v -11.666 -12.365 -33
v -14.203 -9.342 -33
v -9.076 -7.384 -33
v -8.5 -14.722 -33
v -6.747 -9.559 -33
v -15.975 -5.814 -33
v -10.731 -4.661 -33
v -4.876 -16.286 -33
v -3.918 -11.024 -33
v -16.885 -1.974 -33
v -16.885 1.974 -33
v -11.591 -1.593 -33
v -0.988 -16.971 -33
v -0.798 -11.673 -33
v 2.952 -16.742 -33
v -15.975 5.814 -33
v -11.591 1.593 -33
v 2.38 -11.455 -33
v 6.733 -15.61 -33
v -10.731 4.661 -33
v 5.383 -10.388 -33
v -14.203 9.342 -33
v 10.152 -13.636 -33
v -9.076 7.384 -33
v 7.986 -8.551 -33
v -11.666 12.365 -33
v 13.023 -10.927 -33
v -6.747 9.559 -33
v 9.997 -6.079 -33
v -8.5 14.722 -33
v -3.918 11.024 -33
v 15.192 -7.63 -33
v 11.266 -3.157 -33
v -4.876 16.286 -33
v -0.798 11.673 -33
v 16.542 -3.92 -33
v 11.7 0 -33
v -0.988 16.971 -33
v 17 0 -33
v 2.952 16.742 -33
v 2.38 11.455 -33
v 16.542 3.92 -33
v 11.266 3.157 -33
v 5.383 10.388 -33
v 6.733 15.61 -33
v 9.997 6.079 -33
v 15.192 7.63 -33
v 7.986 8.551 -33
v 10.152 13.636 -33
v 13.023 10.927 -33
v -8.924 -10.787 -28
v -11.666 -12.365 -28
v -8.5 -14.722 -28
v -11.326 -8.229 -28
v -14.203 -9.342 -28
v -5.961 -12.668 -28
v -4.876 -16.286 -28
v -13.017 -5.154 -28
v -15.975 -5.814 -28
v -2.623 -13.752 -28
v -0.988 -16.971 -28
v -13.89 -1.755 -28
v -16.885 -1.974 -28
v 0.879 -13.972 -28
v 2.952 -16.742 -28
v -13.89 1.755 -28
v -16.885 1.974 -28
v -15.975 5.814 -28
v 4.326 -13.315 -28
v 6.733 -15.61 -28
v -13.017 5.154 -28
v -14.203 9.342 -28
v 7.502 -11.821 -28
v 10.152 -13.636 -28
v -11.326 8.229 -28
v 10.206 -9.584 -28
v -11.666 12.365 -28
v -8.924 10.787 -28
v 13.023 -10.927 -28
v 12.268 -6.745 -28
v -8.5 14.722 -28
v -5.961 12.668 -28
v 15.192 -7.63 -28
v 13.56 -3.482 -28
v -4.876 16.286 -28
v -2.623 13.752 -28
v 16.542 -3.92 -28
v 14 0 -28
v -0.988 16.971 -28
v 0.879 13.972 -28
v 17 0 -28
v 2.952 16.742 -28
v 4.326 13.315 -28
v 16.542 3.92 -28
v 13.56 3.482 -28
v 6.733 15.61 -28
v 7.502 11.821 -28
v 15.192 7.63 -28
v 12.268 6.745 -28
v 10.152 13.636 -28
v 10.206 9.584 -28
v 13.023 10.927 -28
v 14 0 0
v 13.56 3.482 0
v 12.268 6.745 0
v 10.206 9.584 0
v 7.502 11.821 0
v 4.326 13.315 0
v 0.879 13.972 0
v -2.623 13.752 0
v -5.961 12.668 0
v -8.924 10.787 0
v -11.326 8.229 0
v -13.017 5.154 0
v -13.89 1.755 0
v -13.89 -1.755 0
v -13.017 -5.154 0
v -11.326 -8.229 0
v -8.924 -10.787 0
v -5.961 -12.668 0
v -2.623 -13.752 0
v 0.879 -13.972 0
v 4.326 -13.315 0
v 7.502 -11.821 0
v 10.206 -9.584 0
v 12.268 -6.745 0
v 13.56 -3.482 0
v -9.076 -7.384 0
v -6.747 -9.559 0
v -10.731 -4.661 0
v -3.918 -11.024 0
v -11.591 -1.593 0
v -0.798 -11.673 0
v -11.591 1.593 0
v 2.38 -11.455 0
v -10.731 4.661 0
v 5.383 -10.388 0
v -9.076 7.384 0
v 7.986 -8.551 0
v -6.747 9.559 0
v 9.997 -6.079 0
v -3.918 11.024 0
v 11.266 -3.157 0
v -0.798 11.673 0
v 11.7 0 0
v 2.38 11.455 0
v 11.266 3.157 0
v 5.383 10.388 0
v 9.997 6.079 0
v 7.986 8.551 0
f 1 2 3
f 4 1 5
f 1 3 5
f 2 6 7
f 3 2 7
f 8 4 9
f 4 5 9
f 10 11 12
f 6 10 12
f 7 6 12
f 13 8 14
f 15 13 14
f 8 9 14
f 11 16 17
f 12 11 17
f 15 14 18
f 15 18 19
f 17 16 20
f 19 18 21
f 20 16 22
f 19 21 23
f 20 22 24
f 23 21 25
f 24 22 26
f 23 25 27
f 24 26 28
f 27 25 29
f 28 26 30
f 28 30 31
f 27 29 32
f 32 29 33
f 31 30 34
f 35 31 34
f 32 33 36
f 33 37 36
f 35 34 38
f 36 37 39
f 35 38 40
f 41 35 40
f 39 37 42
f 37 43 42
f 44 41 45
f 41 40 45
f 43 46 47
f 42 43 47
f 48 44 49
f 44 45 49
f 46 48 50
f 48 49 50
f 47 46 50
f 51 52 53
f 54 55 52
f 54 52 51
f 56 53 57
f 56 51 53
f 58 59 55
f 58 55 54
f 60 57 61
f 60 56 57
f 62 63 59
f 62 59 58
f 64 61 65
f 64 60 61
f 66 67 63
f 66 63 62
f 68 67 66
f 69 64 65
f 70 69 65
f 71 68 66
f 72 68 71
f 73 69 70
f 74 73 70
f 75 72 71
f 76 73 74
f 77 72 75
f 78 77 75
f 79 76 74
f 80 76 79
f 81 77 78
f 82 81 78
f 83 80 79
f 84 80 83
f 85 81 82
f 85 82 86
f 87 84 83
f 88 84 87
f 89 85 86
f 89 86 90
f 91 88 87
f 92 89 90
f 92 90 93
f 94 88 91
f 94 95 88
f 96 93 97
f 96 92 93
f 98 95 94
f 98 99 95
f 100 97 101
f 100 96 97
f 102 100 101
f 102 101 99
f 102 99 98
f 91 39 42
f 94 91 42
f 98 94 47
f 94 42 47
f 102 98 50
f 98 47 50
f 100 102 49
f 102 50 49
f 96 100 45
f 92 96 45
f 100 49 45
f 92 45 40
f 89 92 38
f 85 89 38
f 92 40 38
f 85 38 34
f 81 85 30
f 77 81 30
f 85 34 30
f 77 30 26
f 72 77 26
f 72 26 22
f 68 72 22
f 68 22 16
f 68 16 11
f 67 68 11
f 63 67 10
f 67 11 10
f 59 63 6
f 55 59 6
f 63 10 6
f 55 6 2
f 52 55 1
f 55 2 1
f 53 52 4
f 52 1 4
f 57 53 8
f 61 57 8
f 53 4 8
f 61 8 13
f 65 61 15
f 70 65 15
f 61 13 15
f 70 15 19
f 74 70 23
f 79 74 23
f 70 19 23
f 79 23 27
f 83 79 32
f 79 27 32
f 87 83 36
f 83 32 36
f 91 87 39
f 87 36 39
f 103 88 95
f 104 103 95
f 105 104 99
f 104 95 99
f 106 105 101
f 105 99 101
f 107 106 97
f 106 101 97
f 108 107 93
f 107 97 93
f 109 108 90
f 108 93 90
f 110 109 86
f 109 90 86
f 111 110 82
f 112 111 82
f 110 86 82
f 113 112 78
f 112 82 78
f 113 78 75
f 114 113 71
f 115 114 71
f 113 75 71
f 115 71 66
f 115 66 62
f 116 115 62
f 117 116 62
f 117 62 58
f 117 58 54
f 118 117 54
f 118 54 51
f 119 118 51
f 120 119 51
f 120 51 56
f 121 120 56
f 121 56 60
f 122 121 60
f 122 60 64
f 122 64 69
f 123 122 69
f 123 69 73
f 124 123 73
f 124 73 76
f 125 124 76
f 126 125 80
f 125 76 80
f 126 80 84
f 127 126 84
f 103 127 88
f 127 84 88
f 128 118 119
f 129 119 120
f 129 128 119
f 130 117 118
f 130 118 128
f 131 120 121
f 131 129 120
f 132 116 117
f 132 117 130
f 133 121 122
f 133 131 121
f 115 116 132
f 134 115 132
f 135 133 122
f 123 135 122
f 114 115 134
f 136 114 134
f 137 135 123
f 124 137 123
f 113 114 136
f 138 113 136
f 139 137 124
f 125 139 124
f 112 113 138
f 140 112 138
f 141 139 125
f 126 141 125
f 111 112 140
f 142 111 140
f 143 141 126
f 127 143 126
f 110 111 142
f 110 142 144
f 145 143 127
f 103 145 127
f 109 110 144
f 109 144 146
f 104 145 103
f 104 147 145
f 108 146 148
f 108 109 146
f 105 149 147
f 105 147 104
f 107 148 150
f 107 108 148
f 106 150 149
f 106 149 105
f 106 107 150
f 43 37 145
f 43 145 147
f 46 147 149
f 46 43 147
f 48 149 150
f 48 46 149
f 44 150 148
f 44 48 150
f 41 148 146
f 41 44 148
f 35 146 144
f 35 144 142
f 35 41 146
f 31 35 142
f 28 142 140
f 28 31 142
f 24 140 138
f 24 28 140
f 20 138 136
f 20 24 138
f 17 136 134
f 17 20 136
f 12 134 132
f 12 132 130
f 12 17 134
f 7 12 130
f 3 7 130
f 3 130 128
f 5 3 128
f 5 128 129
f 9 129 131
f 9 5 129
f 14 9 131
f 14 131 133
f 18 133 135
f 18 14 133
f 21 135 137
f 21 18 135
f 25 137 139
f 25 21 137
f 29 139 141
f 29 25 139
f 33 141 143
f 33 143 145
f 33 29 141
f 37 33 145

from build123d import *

# Parameters (mm, degrees)
CYLINDER093_R     = 1.5
CYLINDER093_DEPTH = 14
CYLINDER090_R     = 11.7
CYLINDER090_DEPTH = 33
CYLINDER094_R     = 1.5
CYLINDER094_DEPTH = 14
CYLINDER088_R     = 14
CYLINDER088_DEPTH = 33
BOX016_W          = 1
BOX016_H          = 1
BOX016_DEPTH      = 1
CYLINDER084_R     = 17
CYLINDER084_DEPTH = 5


with BuildPart() as ftinsmount1:
    # Cylinder093 → Cylinder093 (new body)
    with BuildSketch(Plane(origin=(53.66, 148, -15), x_dir=(1, 0, 0), z_dir=(0, 0, 1))):
        Circle(CYLINDER093_R)
    extrude(amount=CYLINDER093_DEPTH)


with BuildPart() as ftinsinnerhole:
    # Cylinder090 → Cylinder090 (new body)
    with BuildSketch(Plane(origin=(73.66, 148, -10), x_dir=(1, 0, 0), z_dir=(0, 0, 1))):
        Circle(CYLINDER090_R)
    extrude(amount=CYLINDER090_DEPTH)


with BuildPart() as fusion039:
    # Cylinder094 → Cylinder094 (new body)
    with BuildSketch(Plane(origin=(93.66, 148, -14), x_dir=(1, 0, 0), z_dir=(0, 0, 1))):
        Circle(CYLINDER094_R)
    extrude(amount=CYLINDER094_DEPTH)

    # Fusion039: union FTInsMount1, FTInsInnerHole
    add(ftinsmount1.part)
    add(ftinsinnerhole.part)


with BuildPart() as feedthrough008:
    # Cylinder088 → Cylinder088 (new body)
    with BuildSketch(Plane(origin=(73.66, 148, -10), x_dir=(1, 0, 0), z_dir=(0, 0, 1))):
        Circle(CYLINDER088_R)
    extrude(amount=CYLINDER088_DEPTH)


with BuildPart() as ftinslug:
    # Box016 → Box016 (new body)
    with BuildSketch(Plane(origin=(63, 136, -8), x_dir=(1, 0, 0), z_dir=(0, 0, 1))):
        with Locations((0.5, 0.5)):
            Rectangle(BOX016_W, BOX016_H)
    extrude(amount=BOX016_DEPTH)


with BuildPart() as base_ftinsulator1:
    # Cylinder084 → Cylinder084 (new body)
    with BuildSketch(Plane(origin=(73.66, 148, -10), x_dir=(1, 0, 0), z_dir=(0, 0, 1))):
        Circle(CYLINDER084_R)
    extrude(amount=CYLINDER084_DEPTH)

    # Fusion038: union Feedthrough008, FTInsLug
    add(feedthrough008.part)
    add(ftinslug.part)

    # Cut010: cut Fusion039
    add(fusion039.part, mode=Mode.SUBTRACT)


with BuildPart() as base_ftinsulator1_1:
    # Cut010 placement: moved
    add(base_ftinsulator1.part.moved(Location((-73.66, -148, -23))))


solid = base_ftinsulator1_1.part
